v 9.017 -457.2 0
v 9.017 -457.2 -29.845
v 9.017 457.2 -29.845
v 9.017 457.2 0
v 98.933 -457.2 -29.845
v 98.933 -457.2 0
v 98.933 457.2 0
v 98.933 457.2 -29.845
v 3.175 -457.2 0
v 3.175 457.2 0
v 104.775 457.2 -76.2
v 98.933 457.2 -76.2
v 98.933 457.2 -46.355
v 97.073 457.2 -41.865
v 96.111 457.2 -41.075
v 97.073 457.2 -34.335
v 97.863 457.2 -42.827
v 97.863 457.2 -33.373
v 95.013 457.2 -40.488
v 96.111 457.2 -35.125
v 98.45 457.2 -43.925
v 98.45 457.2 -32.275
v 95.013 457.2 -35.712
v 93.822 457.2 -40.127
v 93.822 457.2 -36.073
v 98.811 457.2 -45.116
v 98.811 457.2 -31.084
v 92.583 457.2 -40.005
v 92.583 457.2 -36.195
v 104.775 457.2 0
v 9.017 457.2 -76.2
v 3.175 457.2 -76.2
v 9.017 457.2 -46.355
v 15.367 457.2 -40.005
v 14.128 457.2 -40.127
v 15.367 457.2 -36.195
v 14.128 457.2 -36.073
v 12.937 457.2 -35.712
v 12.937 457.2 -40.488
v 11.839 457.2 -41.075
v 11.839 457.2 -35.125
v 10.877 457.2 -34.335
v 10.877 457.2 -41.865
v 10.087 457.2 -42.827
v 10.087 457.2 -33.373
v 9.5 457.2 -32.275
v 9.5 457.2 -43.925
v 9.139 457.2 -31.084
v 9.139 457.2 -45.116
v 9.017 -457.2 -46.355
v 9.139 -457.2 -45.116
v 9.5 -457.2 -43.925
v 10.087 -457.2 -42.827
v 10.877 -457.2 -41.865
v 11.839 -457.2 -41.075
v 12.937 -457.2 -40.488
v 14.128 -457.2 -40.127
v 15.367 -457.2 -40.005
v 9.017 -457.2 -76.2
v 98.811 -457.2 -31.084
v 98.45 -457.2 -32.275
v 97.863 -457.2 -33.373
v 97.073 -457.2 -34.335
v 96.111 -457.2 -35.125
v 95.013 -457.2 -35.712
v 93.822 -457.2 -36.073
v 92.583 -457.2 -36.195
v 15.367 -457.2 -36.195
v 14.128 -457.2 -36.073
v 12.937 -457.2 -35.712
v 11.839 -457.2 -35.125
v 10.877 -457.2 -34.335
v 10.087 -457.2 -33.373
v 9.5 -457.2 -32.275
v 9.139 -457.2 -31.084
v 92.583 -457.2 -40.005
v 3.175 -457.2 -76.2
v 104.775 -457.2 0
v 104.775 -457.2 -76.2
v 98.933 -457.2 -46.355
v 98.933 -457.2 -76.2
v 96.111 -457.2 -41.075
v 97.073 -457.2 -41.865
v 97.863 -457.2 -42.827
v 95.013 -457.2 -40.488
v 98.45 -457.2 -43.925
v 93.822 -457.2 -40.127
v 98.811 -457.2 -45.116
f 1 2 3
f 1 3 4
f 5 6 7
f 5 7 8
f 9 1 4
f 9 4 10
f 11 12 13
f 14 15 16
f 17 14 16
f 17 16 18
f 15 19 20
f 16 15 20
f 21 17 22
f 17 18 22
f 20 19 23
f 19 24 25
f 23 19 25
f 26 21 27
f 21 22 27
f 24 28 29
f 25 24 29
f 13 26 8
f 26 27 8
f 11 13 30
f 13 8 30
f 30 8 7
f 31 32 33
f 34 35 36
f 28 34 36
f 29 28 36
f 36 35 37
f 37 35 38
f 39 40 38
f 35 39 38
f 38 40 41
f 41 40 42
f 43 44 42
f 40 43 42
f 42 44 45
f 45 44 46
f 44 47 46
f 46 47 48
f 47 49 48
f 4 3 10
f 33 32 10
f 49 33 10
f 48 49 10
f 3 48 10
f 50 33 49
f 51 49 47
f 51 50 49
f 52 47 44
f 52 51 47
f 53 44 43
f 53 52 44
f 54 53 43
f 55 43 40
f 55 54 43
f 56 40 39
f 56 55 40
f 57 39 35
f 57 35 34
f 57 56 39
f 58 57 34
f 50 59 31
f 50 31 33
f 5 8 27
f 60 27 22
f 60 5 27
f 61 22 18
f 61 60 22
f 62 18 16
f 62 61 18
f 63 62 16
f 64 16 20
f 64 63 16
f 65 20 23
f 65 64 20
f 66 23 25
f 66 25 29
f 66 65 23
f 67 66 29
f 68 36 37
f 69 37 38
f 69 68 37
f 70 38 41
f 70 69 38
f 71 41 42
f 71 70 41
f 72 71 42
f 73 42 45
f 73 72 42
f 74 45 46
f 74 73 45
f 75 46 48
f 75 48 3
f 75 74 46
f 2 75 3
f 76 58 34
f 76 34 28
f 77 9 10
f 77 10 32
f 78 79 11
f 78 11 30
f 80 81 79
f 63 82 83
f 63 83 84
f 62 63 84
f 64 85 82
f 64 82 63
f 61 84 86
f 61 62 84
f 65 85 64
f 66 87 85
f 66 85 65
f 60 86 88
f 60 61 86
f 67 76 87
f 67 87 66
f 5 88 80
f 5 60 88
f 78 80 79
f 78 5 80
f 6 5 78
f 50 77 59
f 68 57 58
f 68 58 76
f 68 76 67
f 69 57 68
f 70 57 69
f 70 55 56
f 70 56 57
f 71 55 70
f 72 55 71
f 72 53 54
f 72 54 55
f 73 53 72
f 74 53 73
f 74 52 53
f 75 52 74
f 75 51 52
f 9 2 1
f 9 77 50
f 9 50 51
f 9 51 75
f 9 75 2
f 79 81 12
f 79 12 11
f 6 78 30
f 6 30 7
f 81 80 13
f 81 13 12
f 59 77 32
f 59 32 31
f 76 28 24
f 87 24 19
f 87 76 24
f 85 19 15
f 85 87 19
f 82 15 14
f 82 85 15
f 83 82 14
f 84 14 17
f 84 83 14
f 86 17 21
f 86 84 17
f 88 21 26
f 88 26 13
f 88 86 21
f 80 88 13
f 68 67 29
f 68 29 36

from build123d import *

# Parameters (mm, degrees)
AL_I_BEAM_AL_I_BEAM_4X2_31_1_DEPTH = 914.4


with BuildPart() as part:
    # Sketch11 → Al i beam AL I BEAM 4X2.31(1) (new body)
    with BuildSketch(Plane(origin=(53.975, -457.2, -38.1), x_dir=(0, 0, -1), z_dir=(0, 1, 0))):
        with BuildLine():
            Line((-38.1, -50.8), (-38.1, -44.958))
            Line((-38.1, -44.958), (-8.255, -44.958))
            ThreePointArc((-8.255, -44.958), (-3.764871939, -43.098128061), (-1.905, -38.608))
            Line((-1.905, -38.608), (-1.905, 38.608))
            ThreePointArc((-1.905, 38.608), (-3.764871939, 43.098128061), (-8.255, 44.958))
            Line((-8.255, 44.958), (-38.1, 44.958))
            Line((-38.1, 44.958), (-38.1, 50.8))
            Line((-38.1, 50.8), (38.1, 50.8))
            Line((38.1, 50.8), (38.1, 44.958))
            Line((38.1, 44.958), (8.255, 44.958))
            ThreePointArc((8.255, 44.958), (3.764871939, 43.098128061), (1.905, 38.608))
            Line((1.905, 38.608), (1.905, -38.608))
            ThreePointArc((1.905, -38.608), (3.764871939, -43.098128061), (8.255, -44.958))
            Line((8.255, -44.958), (38.1, -44.958))
            Line((38.1, -44.958), (38.1, -50.8))
            Line((38.1, -50.8), (-38.1, -50.8))
        make_face()
    extrude(amount=AL_I_BEAM_AL_I_BEAM_4X2_31_1_DEPTH)


solid = part.part
